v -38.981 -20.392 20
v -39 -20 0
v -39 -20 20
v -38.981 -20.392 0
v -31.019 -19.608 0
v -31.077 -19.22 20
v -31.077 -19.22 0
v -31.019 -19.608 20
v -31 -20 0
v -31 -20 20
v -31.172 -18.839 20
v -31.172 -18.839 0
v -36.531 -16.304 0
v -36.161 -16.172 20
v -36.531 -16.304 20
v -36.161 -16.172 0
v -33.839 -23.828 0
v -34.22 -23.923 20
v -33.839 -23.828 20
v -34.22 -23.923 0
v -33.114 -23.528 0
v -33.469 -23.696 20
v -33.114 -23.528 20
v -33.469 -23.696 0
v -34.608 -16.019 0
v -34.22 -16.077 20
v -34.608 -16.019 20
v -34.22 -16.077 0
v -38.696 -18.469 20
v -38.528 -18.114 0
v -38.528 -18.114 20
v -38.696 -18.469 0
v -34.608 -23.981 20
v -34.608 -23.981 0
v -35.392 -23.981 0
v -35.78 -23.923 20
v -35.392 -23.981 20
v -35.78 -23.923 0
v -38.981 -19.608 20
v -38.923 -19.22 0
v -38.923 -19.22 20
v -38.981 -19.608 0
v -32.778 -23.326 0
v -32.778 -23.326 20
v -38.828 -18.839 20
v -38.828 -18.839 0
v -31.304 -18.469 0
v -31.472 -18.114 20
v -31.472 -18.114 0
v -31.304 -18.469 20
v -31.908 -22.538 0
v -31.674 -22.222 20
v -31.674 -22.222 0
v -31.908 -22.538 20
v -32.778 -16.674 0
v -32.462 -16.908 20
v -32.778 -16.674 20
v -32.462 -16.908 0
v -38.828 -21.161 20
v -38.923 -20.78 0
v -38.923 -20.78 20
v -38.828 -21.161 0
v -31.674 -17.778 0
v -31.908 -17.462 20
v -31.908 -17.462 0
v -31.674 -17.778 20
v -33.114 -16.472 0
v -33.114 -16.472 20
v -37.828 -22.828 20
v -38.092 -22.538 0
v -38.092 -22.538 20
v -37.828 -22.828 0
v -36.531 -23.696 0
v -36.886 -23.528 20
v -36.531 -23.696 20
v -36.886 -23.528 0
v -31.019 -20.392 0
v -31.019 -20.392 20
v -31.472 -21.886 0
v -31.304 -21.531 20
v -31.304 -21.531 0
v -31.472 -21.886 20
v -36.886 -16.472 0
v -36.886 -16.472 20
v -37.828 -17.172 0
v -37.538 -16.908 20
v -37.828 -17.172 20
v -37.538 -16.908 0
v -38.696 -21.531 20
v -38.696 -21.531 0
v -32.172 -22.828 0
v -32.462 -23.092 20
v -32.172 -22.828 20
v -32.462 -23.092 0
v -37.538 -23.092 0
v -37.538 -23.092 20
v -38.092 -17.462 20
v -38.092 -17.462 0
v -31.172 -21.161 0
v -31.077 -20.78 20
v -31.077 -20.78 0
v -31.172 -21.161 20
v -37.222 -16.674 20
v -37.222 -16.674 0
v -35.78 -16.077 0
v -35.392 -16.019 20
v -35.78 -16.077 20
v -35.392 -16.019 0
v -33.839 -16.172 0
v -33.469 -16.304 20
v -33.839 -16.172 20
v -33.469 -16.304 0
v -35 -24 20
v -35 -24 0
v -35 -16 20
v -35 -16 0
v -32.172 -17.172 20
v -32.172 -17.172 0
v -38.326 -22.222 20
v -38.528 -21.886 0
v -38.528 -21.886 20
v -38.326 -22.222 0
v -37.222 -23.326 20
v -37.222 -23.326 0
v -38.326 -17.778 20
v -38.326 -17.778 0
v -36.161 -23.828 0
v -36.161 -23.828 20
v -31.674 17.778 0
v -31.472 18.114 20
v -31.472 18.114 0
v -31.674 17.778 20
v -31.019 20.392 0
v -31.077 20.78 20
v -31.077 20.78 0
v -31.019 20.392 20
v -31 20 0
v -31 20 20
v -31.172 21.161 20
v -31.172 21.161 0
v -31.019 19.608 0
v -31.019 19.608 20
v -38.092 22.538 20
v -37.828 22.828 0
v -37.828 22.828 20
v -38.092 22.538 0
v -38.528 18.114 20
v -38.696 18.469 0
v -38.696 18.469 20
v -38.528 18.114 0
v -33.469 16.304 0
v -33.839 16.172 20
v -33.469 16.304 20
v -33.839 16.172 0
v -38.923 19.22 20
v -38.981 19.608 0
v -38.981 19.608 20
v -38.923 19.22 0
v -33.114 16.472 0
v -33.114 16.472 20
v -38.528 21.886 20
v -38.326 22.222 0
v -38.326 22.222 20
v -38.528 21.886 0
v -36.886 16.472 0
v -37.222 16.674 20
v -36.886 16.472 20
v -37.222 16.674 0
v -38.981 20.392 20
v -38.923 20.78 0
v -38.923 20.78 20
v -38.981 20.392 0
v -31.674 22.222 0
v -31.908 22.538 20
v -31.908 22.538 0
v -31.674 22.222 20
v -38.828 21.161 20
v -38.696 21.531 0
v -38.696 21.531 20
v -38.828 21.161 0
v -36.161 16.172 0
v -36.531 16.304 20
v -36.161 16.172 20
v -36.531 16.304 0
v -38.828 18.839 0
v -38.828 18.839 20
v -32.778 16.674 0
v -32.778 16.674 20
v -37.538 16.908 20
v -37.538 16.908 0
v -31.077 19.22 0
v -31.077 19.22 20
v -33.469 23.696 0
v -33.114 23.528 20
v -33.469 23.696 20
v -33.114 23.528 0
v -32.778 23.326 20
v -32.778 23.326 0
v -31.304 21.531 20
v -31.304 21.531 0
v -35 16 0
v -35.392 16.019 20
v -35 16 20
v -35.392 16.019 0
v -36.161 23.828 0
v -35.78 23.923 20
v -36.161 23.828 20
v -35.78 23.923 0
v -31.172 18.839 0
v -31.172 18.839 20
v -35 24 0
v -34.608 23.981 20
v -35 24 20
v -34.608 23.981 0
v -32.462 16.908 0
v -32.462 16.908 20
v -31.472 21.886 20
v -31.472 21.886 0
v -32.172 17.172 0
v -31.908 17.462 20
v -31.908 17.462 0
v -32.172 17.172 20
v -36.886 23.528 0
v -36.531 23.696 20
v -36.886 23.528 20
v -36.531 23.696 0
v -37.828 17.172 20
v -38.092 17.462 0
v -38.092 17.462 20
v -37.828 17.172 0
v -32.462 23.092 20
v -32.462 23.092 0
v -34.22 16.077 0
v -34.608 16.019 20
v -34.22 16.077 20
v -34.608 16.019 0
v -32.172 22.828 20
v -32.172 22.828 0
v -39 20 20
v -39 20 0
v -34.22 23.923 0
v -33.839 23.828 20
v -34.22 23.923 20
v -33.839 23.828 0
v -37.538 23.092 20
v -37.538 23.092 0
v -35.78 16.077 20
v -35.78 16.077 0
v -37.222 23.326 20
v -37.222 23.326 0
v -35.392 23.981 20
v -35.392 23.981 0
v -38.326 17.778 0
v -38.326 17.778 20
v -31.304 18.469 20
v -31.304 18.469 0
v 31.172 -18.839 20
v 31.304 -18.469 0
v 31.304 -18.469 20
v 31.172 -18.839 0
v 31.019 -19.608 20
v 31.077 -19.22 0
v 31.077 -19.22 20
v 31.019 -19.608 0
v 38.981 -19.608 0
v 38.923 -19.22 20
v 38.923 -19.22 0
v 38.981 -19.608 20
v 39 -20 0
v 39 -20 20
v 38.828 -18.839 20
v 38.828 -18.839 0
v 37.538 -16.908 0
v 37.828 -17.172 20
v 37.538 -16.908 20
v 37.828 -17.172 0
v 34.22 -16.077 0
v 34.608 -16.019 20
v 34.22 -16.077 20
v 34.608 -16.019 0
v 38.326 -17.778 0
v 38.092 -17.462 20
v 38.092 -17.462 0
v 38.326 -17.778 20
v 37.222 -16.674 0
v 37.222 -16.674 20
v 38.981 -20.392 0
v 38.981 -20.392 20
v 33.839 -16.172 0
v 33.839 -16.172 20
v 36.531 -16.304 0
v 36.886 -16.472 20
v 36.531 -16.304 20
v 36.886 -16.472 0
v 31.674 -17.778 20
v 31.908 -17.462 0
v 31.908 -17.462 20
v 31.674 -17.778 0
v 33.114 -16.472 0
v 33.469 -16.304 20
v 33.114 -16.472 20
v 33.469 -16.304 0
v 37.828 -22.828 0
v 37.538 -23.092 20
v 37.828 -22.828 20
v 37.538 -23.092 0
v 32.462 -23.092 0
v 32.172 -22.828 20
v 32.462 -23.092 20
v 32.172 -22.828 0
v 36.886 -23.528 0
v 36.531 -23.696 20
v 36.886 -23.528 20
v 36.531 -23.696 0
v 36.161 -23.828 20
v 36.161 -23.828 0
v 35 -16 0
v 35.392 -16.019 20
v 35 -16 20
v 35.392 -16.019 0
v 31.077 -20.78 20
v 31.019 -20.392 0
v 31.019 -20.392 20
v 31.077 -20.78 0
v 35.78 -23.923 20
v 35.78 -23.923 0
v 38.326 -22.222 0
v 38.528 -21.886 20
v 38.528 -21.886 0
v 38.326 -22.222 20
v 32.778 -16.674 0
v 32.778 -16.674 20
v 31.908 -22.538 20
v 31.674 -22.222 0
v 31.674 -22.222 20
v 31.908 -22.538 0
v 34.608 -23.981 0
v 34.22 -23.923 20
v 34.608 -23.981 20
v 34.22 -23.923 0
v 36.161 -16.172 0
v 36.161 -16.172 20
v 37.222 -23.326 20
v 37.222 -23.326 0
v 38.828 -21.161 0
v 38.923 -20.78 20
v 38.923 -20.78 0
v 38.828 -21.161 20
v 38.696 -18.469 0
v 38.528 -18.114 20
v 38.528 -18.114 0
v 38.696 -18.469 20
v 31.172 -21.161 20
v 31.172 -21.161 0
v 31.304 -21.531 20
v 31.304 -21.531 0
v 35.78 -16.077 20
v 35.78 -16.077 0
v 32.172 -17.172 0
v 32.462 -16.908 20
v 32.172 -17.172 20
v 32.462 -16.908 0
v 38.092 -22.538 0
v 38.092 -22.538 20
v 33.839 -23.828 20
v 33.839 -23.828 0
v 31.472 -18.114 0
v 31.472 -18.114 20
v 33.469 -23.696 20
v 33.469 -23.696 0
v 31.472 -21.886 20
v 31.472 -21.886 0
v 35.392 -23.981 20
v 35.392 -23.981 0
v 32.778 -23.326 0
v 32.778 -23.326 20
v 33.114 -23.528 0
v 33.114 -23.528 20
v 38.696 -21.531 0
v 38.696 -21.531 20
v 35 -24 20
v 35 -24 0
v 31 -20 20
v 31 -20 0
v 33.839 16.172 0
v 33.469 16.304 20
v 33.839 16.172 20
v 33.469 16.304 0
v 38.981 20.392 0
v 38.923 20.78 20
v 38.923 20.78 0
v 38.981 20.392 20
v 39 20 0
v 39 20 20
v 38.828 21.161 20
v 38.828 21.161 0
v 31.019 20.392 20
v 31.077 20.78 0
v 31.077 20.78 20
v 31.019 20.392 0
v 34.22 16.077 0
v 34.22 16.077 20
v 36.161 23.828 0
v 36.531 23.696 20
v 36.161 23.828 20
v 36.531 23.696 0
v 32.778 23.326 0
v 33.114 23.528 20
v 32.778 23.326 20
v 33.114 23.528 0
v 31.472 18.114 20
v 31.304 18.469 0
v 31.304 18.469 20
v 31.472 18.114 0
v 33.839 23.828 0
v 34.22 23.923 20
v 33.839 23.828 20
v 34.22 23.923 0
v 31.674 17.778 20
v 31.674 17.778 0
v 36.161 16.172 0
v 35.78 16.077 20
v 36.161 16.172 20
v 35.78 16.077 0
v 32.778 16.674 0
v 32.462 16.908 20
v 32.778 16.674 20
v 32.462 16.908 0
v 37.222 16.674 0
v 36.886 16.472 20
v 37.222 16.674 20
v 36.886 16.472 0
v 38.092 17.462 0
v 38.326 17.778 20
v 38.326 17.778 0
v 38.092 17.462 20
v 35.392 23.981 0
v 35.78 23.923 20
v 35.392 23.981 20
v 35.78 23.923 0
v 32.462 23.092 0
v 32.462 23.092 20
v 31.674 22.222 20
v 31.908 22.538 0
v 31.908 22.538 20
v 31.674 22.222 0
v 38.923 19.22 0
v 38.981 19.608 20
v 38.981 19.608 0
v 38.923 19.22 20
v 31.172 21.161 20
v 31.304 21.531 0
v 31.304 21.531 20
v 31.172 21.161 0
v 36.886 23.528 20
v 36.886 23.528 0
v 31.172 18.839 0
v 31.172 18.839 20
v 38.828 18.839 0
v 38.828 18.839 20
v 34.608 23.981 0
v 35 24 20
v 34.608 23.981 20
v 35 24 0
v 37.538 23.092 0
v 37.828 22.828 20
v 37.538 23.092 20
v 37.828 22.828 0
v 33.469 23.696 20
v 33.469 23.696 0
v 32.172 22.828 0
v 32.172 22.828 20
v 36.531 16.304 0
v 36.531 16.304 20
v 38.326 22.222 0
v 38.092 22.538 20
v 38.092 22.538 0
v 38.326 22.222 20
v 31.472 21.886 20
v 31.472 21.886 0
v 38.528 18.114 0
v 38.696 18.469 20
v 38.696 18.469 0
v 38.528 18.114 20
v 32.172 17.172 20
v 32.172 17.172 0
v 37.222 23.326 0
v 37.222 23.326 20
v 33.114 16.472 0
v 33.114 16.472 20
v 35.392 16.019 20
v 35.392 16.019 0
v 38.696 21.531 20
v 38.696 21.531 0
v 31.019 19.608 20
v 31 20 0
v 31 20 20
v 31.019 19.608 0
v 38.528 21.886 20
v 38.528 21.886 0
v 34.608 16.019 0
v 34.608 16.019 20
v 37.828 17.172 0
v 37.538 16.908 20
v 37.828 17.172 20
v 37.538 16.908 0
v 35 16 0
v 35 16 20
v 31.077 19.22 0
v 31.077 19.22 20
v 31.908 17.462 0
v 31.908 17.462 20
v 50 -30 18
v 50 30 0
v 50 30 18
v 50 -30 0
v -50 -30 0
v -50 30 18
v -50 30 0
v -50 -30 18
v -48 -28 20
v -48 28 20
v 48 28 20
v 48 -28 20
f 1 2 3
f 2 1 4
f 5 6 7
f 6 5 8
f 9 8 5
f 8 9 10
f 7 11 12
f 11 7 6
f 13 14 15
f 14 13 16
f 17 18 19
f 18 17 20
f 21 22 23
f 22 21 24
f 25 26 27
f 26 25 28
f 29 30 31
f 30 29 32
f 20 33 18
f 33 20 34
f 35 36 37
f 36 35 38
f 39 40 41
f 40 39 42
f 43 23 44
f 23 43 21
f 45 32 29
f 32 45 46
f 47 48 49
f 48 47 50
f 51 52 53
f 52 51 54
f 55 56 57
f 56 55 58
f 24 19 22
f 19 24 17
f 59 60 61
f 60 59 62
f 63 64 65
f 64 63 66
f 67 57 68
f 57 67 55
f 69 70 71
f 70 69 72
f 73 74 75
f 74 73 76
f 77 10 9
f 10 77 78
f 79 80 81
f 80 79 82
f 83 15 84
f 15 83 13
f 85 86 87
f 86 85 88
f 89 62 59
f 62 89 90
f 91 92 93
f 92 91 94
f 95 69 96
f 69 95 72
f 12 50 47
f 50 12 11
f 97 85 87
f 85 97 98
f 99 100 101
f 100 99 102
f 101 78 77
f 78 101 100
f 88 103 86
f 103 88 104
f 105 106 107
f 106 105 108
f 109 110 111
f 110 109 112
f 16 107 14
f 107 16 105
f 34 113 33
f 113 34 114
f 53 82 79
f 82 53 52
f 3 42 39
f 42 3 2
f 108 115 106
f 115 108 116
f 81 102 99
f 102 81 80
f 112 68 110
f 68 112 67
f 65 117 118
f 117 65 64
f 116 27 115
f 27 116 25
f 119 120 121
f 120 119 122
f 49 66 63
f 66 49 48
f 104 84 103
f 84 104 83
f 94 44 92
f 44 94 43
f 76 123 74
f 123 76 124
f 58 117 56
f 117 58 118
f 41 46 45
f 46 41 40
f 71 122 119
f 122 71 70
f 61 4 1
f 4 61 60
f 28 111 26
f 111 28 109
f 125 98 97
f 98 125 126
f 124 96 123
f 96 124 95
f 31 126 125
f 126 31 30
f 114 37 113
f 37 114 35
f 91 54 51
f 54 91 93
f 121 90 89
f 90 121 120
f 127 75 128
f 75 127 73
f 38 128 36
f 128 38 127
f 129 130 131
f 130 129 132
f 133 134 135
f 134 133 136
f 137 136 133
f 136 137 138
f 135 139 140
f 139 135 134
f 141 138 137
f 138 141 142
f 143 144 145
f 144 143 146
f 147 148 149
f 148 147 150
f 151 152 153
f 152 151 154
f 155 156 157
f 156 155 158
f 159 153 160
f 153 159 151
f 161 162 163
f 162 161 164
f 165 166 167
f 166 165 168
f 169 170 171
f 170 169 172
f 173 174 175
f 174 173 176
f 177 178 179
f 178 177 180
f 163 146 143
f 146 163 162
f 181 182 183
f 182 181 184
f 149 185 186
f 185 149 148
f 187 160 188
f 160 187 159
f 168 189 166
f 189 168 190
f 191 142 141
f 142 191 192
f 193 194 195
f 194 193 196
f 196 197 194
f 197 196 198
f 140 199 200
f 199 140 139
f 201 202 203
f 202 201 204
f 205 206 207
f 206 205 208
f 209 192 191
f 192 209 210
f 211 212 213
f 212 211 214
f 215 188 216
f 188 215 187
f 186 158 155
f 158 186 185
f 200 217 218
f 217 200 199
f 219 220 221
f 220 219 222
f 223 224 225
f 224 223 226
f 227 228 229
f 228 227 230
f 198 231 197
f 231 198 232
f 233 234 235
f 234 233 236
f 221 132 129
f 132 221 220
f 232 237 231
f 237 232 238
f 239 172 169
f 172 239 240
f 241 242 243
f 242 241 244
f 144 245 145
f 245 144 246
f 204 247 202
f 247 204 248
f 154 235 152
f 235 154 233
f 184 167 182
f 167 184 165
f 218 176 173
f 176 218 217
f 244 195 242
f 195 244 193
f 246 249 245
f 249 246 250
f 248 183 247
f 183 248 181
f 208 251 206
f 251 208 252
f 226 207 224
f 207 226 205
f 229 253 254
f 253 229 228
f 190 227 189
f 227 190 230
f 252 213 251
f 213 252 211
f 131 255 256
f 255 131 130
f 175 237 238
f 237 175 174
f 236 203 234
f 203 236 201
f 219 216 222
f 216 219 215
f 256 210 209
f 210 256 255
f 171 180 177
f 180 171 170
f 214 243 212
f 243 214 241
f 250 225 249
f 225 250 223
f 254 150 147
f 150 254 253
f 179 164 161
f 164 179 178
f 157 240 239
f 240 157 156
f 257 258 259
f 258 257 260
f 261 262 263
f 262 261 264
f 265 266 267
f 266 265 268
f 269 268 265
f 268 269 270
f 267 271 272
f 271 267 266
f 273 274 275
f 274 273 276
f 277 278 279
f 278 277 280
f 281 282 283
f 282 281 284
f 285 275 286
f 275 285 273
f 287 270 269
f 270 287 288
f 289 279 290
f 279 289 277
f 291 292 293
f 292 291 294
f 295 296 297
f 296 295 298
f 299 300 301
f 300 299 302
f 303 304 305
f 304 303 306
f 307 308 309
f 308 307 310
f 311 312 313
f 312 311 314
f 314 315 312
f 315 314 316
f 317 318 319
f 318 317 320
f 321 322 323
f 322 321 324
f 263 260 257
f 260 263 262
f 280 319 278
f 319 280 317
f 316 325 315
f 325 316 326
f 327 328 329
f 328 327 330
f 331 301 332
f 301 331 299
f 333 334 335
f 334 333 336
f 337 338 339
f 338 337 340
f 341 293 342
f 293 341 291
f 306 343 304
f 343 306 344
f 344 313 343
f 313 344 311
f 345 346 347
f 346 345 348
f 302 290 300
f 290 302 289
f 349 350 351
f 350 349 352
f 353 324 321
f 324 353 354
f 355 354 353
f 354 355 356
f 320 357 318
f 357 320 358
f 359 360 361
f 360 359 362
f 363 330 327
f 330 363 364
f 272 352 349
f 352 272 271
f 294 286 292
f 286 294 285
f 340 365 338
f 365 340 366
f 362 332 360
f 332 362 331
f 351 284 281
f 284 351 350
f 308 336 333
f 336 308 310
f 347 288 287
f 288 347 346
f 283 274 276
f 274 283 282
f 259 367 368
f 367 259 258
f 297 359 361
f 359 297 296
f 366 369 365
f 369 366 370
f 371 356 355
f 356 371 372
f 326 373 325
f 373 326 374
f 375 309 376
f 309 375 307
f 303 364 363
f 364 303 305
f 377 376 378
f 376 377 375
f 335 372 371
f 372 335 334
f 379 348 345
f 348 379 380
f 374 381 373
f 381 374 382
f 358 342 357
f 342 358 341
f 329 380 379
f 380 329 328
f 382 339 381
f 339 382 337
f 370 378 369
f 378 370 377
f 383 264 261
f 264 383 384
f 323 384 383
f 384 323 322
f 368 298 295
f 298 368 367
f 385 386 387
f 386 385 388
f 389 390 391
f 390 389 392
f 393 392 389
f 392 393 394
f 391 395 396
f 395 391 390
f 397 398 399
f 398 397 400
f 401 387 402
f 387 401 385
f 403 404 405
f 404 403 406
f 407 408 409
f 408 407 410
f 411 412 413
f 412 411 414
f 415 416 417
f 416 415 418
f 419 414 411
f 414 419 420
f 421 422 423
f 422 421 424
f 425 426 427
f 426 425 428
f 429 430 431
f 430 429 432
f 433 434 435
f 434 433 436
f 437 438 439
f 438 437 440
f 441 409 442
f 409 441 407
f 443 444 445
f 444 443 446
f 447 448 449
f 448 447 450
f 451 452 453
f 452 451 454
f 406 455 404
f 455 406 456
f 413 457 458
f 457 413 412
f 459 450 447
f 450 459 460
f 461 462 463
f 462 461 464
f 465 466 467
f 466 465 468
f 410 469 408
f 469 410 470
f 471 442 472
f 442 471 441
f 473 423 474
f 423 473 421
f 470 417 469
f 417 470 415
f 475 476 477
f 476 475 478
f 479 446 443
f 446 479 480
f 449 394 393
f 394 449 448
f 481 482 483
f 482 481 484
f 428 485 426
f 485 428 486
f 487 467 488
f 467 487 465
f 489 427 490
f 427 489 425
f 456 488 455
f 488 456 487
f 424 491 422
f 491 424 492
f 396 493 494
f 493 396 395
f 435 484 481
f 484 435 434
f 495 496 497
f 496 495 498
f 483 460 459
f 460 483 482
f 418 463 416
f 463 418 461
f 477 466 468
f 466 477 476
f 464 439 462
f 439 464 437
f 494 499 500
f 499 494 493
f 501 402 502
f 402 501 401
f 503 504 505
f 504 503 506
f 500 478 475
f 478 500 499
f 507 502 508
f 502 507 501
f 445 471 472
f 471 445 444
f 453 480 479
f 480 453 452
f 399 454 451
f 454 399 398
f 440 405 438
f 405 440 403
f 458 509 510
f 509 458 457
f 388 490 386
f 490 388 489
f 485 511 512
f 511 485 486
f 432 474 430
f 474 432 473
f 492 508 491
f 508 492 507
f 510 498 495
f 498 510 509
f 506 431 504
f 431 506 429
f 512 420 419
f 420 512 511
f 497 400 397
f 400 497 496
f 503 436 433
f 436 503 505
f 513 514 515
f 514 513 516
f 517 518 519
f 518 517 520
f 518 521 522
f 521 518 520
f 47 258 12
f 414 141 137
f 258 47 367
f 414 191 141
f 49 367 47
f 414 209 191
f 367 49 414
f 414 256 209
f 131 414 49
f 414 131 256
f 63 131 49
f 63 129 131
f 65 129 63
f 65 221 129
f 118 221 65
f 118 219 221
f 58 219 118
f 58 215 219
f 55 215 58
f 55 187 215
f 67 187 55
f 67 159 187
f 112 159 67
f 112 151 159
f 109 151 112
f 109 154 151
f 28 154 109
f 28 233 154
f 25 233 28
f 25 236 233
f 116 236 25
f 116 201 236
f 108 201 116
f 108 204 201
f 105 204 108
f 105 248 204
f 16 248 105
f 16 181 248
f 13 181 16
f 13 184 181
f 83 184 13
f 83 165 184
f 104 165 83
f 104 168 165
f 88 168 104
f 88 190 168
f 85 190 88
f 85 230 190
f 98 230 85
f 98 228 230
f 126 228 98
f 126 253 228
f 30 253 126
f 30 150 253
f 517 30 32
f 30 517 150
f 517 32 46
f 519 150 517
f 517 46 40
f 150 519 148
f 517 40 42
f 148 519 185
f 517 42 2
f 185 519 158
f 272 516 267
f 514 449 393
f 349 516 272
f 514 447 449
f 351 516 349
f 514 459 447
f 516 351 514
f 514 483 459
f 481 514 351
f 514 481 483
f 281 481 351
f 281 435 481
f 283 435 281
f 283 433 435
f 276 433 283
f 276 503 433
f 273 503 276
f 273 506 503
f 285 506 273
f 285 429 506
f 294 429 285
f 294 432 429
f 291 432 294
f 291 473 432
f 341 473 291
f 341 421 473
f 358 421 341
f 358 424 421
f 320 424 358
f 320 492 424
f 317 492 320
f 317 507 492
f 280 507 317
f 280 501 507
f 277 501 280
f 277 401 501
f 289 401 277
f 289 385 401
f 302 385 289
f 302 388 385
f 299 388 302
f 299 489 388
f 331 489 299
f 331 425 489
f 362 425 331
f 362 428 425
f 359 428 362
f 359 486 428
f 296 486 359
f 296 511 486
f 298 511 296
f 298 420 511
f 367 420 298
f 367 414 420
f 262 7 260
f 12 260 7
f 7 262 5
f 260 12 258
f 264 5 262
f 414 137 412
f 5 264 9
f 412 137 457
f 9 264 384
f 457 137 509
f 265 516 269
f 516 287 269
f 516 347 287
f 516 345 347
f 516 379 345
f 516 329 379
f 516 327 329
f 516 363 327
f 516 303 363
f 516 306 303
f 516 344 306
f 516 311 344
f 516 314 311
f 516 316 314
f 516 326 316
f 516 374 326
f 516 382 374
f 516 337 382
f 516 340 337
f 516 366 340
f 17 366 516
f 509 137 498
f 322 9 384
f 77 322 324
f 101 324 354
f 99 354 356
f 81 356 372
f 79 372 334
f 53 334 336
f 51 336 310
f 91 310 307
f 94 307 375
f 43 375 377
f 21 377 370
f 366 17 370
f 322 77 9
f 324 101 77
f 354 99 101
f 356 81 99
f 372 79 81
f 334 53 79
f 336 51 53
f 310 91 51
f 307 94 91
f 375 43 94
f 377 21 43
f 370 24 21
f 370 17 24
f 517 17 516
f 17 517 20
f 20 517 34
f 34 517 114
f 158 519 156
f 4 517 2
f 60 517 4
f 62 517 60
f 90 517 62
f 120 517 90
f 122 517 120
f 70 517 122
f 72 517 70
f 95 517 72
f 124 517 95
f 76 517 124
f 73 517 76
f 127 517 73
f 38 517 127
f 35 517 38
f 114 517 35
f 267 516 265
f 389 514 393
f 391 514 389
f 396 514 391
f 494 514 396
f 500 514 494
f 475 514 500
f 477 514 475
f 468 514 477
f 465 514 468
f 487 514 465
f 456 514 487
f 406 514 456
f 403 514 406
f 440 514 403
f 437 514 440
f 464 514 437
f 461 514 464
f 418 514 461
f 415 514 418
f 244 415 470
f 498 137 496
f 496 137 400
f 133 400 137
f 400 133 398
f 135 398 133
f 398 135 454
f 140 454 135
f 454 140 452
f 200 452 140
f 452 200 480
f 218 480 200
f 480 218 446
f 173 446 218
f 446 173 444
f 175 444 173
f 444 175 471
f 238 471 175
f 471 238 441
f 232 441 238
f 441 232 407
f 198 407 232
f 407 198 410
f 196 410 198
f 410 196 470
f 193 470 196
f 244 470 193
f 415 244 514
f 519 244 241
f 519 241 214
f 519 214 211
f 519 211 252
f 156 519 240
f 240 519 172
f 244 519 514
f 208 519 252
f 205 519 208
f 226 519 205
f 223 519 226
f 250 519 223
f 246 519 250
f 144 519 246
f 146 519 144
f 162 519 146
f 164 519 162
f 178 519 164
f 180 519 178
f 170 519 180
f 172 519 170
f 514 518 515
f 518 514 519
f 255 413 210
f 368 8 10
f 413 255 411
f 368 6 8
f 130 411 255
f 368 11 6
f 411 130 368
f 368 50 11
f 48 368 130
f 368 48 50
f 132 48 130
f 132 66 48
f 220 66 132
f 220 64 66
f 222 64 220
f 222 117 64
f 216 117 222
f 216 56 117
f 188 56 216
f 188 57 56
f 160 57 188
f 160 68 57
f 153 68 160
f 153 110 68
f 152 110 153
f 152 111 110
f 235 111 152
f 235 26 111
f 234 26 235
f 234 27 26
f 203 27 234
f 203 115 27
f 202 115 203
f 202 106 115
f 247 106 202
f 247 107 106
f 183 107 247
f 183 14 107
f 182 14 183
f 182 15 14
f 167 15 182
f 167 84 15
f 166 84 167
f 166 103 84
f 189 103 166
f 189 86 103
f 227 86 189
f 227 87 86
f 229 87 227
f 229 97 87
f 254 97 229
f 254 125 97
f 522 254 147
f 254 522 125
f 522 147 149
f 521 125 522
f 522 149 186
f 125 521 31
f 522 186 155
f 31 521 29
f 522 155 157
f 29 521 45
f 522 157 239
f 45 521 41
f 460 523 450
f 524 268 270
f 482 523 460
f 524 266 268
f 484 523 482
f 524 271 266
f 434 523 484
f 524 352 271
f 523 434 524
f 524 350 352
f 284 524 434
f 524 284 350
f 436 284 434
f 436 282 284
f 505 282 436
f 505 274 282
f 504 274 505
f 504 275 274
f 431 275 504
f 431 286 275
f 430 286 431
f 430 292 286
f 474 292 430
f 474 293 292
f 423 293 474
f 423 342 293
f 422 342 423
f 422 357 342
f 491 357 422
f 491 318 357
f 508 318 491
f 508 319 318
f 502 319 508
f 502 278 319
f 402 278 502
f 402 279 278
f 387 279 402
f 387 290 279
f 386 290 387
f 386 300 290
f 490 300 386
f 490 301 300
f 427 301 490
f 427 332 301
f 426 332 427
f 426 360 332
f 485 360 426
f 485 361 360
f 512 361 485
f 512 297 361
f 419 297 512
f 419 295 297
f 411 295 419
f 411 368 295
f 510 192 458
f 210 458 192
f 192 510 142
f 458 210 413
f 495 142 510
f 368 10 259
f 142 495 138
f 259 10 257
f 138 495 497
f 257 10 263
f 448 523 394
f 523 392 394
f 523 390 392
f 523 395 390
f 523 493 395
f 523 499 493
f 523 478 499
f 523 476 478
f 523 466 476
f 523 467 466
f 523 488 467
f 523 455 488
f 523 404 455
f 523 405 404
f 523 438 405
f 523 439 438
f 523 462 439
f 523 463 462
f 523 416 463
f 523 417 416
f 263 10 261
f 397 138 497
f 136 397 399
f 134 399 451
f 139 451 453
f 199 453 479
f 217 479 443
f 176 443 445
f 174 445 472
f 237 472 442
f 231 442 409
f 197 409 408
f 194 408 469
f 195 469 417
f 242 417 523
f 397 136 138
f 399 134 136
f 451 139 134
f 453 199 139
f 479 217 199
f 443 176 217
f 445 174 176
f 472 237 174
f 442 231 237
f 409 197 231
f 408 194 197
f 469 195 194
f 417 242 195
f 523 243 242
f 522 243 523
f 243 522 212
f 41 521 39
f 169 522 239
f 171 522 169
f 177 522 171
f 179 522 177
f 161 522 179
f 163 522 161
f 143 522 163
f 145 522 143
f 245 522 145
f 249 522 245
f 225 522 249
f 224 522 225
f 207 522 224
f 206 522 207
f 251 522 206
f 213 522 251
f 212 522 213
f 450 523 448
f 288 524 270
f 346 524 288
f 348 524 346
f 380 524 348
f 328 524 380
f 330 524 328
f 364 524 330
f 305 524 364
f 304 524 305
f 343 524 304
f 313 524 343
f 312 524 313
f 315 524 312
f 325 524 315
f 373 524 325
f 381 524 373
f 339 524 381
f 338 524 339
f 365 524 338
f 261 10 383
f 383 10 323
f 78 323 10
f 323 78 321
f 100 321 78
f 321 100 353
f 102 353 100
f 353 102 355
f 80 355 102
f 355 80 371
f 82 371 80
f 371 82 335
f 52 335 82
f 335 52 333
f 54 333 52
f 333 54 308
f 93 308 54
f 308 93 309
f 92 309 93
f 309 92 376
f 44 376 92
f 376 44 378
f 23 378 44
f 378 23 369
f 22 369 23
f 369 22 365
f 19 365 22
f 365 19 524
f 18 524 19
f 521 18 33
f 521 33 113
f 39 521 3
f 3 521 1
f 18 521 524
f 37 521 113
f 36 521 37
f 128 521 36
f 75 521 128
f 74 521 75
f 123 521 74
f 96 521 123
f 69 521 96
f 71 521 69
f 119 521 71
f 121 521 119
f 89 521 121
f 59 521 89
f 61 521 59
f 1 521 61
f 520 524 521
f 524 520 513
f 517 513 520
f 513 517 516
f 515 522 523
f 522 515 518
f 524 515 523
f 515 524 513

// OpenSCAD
// Rectangular Block with Top Perimeter Chamfer and Holes
// Units in millimeters

$fn = 64;

// Main Dimensions
length = 100;
width = 60;
height = 20;

// Chamfer Dimension
chamfer = 2;

// Hole Placement and Dimensions
hole_d = 8;
hole_x = 35;
hole_y = 20;

module main_block() {
    hull() {
        // Lower portion of the block up to the chamfer start height
        translate([-length / 2, -width / 2, 0])
            cube([length, width, height - chamfer]);
        
        // Reduced top face producing a 2mm chamfer on all top perimeter edges
        translate([-(length / 2 - chamfer), -(width / 2 - chamfer), height - 0.01])
            cube([length - 2 * chamfer, width - 2 * chamfer, 0.01]);
    }
}

module holes() {
    for (x = [-hole_x, hole_x]) {
        for (y = [-hole_y, hole_y]) {
            translate([x, y, -1])
                cylinder(d = hole_d, h = height + 2);
        }
    }
}

module part() {
    difference() {
        main_block();
        holes();
    }
}

part();
